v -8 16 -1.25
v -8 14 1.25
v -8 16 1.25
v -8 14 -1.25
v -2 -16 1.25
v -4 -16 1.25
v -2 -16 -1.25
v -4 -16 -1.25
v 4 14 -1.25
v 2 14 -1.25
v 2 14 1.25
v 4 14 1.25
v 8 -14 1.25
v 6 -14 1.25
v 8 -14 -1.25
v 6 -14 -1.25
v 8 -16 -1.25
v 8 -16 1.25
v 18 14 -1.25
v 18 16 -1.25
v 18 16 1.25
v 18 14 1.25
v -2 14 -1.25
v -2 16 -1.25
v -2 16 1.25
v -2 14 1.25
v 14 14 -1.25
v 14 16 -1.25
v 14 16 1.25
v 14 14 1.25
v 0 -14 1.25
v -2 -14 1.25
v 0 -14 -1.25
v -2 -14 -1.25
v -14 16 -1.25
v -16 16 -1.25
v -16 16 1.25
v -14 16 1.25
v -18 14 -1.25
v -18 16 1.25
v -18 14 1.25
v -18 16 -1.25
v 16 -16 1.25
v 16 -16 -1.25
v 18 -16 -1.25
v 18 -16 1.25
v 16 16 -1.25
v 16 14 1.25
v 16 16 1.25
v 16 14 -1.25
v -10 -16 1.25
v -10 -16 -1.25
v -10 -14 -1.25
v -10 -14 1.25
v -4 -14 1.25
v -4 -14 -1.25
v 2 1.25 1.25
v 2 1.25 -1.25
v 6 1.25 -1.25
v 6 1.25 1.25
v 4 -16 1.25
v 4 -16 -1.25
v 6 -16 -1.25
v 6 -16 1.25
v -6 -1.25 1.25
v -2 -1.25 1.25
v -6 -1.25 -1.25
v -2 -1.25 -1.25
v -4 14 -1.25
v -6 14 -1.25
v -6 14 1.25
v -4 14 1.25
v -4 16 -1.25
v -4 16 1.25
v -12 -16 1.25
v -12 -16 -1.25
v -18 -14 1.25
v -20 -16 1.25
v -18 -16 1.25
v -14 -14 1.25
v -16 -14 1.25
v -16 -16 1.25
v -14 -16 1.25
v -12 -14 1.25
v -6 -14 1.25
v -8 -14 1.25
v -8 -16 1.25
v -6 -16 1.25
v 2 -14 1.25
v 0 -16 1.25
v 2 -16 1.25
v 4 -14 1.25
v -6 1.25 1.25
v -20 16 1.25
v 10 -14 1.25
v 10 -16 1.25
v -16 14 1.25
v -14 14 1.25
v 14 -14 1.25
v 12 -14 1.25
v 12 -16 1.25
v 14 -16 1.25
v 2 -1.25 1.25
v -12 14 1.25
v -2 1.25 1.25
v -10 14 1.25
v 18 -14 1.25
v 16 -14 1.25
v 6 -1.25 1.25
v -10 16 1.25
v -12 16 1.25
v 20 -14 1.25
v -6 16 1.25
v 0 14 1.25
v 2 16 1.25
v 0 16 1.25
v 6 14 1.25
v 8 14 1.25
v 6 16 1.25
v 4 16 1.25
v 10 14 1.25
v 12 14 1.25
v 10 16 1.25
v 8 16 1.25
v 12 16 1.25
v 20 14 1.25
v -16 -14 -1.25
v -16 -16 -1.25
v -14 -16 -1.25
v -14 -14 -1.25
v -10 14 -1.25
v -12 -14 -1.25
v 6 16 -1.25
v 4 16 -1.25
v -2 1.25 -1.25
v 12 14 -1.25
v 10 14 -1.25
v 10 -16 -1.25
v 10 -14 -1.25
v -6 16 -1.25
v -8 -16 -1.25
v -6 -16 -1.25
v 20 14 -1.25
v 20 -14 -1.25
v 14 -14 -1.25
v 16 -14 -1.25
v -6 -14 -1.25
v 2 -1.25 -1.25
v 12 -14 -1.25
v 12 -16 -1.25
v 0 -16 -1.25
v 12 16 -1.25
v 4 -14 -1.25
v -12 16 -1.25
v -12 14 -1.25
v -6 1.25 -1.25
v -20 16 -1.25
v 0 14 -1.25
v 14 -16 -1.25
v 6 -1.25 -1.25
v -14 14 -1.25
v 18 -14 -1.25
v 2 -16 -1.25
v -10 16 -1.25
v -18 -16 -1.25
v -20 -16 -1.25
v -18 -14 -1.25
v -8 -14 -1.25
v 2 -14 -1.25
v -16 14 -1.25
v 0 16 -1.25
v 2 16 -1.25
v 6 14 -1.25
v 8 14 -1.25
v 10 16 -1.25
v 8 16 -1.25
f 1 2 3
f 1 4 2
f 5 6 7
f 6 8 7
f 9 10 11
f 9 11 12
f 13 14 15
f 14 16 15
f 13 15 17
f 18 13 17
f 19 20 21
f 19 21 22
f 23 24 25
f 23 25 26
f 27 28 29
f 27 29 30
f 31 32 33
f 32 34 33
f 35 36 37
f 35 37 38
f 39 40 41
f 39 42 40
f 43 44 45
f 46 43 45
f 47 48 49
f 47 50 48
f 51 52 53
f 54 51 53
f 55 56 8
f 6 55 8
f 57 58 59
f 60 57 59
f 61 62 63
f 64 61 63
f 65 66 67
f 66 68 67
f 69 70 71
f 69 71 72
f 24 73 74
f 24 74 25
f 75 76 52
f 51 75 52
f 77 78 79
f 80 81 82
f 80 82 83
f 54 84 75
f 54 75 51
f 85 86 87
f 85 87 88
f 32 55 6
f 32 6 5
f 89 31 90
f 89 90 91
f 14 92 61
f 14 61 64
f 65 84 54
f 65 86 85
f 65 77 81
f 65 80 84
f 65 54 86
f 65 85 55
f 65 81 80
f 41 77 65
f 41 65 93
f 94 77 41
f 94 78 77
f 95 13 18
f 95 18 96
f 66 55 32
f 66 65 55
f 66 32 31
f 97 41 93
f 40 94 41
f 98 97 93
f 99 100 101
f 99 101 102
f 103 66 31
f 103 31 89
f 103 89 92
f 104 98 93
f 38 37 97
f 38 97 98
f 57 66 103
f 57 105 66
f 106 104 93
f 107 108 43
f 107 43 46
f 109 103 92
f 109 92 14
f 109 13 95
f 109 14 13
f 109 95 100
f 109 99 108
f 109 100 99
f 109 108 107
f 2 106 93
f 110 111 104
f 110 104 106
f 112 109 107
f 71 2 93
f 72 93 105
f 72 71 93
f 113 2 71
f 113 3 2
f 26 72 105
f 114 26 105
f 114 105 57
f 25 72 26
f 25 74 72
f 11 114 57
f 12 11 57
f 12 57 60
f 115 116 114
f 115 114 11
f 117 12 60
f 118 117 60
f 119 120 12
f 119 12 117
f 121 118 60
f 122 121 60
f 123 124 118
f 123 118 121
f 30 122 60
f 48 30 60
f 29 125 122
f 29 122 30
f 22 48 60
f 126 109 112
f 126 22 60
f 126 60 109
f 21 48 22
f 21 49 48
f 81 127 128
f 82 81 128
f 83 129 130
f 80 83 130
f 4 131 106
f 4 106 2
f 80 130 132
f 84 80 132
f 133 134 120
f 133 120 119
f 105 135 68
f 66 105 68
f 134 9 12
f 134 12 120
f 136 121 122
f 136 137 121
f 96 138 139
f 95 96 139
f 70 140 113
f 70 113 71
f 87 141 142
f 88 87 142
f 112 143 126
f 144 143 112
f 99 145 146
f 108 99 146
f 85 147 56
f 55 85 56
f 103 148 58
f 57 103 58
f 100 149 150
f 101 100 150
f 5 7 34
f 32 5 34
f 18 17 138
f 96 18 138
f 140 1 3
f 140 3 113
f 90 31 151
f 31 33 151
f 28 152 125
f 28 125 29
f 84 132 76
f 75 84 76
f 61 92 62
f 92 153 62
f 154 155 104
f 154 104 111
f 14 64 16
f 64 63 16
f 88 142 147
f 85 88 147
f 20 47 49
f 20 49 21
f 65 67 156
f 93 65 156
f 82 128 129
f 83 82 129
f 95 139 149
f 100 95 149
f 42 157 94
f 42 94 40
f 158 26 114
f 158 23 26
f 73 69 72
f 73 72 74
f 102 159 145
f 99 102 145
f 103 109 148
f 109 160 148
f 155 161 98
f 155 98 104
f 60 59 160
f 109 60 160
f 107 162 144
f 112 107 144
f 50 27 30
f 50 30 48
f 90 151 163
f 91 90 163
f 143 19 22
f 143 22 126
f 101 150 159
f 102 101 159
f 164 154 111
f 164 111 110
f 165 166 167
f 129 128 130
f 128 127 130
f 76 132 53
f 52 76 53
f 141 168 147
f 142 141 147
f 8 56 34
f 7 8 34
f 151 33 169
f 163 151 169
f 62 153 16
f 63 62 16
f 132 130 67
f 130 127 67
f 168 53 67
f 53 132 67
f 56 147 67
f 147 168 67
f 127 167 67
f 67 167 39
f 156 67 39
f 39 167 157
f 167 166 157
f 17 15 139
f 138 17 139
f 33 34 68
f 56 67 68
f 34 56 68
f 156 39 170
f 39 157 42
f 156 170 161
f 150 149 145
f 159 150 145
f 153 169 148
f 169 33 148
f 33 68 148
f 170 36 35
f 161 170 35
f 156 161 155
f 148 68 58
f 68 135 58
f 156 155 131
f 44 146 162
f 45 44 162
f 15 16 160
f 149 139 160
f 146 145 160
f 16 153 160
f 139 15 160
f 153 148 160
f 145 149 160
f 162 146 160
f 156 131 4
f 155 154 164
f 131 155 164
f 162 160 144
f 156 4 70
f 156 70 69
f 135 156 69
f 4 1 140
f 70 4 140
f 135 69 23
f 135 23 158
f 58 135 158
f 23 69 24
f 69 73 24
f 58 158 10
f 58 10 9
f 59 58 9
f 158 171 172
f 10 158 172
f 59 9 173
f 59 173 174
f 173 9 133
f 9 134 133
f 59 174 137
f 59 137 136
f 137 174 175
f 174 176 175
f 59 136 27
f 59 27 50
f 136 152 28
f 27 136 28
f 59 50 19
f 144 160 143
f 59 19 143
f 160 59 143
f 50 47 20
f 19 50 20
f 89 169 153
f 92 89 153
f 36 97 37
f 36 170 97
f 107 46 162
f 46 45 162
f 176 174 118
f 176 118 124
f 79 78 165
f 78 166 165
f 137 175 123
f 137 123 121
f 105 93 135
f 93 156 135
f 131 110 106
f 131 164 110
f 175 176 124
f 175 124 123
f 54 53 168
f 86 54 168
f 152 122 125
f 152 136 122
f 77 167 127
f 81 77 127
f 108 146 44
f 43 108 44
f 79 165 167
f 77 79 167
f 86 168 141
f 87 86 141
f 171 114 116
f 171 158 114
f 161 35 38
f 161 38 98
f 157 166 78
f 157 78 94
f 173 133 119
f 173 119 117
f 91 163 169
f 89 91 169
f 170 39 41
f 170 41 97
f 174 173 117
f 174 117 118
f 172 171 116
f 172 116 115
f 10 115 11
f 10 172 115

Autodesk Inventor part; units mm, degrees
ref_plane "YZ Plane" through (0, 0, 0) normal (1, 0, 0) x (0, 1, 0)
ref_plane "XZ Plane" through (0, 0, 0) normal (0, 1, 0) x (-1, 0, 0)
ref_plane "XY Plane" through (0, 0, 0) normal (0, 0, 1) x (1, 0, 0)
sketch "Sketch1" plane through (0, 0, 0) normal (0, 0, 1) x (1, 0, 0)
  line L0 (0, 8.7149) -> (0, -8.7149) construction
  line L1 (-12.4402, 0) -> (12.4402, 0) construction
  line L2 (-20, 14) -> (20, 14) construction
  line L3 (20, 14) -> (20, -14) construction
  line L4 (20, -14) -> (-20, -14) construction
  line L5 (-20, -14) -> (-20, 14) construction
  line L6 (-6, 1.25) -> (-2, 1.25)
  line L7 (-2, 1.25) -> (-2, -1.25)
  line L8 (-2, -1.25) -> (-6, -1.25)
  line L9 (-6, -1.25) -> (-6, 1.25)
  line L10 (2, 1.25) -> (6, 1.25)
  line L11 (6, 1.25) -> (6, -1.25)
  line L12 (6, -1.25) -> (2, -1.25)
  line L13 (2, -1.25) -> (2, 1.25)
  line L14 (-20, 14) -> (-20, 16)
  line L15 (-20, 16) -> (-18, 16)
  line L16 (-18, 16) -> (-18, 14)
  line L17 (-16, 14) -> (-16, 16)
  line L18 (-16, 16) -> (-14, 16)
  line L19 (-14, 16) -> (-14, 14)
  line L20 (-12, 14) -> (-12, 16)
  line L21 (-12, 16) -> (-10, 16)
  line L22 (-10, 16) -> (-10, 14)
  line L23 (-8, 14) -> (-8, 16)
  line L24 (-8, 16) -> (-6, 16)
  line L25 (-6, 16) -> (-6, 14)
  line L26 (-4, 14) -> (-4, 16)
  line L27 (-4, 16) -> (-2, 16)
  line L28 (-2, 16) -> (-2, 14)
  line L29 (0, 14) -> (0, 16)
  line L30 (0, 16) -> (2, 16)
  line L31 (2, 16) -> (2, 14)
  line L32 (4, 14) -> (4, 16)
  line L33 (4, 16) -> (6, 16)
  line L34 (6, 16) -> (6, 14)
  line L35 (8, 14) -> (8, 16)
  line L36 (8, 16) -> (10, 16)
  line L37 (10, 16) -> (10, 14)
  line L38 (12, 14) -> (12, 16)
  line L39 (12, 16) -> (14, 16)
  line L40 (14, 16) -> (14, 14)
  line L41 (16, 14) -> (16, 16)
  line L42 (16, 16) -> (18, 16)
  line L43 (18, 16) -> (18, 14)
  line L44 (-10, 14) -> (-8, 14)
  line L45 (-14, 14) -> (-12, 14)
  line L46 (-18, 14) -> (-16, 14)
  line L47 (-6, 14) -> (-4, 14)
  line L48 (-2, 14) -> (0, 14)
  line L49 (2, 14) -> (4, 14)
  line L50 (6, 14) -> (8, 14)
  line L51 (10, 14) -> (12, 14)
  line L52 (14, 14) -> (16, 14)
  line L53 (-20, -14) -> (-20, -16)
  line L54 (-20, -16) -> (-18, -16)
  line L55 (-18, -16) -> (-18, -14)
  line L56 (-16, -14) -> (-16, -16)
  line L57 (-14, -16) -> (-14, -14)
  line L58 (-16, -16) -> (-14, -16)
  line L59 (-12, -14) -> (-12, -16)
  line L60 (-10, -16) -> (-10, -14)
  line L61 (-12, -16) -> (-10, -16)
  line L62 (-8, -14) -> (-8, -16)
  line L63 (-6, -16) -> (-6, -14)
  line L64 (-8, -16) -> (-6, -16)
  line L65 (-4, -14) -> (-4, -16)
  line L66 (-2, -16) -> (-2, -14)
  line L67 (-4, -16) -> (-2, -16)
  line L68 (0, -14) -> (0, -16)
  line L69 (2, -16) -> (2, -14)
  line L70 (0, -16) -> (2, -16)
  line L71 (4, -14) -> (4, -16)
  line L72 (6, -16) -> (6, -14)
  line L73 (4, -16) -> (6, -16)
  line L74 (8, -14) -> (8, -16)
  line L75 (10, -16) -> (10, -14)
  line L76 (8, -16) -> (10, -16)
  line L77 (12, -14) -> (12, -16)
  line L78 (14, -16) -> (14, -14)
  line L79 (12, -16) -> (14, -16)
  line L80 (16, -14) -> (16, -16)
  line L81 (18, -16) -> (18, -14)
  line L82 (16, -16) -> (18, -16)
  line L83 (-18, -14) -> (-16, -14)
  line L84 (-14, -14) -> (-12, -14)
  line L85 (-10, -14) -> (-8, -14)
  line L86 (-6, -14) -> (-4, -14)
  line L87 (-2, -14) -> (0, -14)
  line L88 (2, -14) -> (4, -14)
  line L89 (6, -14) -> (8, -14)
  line L90 (10, -14) -> (12, -14)
  line L91 (14, -14) -> (16, -14)
  line L92 (18, -14) -> (20, -14)
  line L93 (18, 14) -> (20, 14)
  line L94 (20, 14) -> (20, -14)
  line L95 (-20, 14) -> (-20, -14)
  point P0 (0, 0)
  point P1 (0, 0)
  dimension "d0" = 4
  dimension "d1" = 4
  dimension "d2" = 4
  dimension "d3" = 2.5
  dimension "d4" = 28
  dimension "d5" = 40
  dimension "d10" = 2
  dimension "d11" = 2
  dimension "d14" = 4
  dimension "d19" = 2
  dimension "d22" = 4
extrude "Extrusion1" add sketch "Sketch1" along normal mid plane 2.5
properties part number "pitahaya4"
